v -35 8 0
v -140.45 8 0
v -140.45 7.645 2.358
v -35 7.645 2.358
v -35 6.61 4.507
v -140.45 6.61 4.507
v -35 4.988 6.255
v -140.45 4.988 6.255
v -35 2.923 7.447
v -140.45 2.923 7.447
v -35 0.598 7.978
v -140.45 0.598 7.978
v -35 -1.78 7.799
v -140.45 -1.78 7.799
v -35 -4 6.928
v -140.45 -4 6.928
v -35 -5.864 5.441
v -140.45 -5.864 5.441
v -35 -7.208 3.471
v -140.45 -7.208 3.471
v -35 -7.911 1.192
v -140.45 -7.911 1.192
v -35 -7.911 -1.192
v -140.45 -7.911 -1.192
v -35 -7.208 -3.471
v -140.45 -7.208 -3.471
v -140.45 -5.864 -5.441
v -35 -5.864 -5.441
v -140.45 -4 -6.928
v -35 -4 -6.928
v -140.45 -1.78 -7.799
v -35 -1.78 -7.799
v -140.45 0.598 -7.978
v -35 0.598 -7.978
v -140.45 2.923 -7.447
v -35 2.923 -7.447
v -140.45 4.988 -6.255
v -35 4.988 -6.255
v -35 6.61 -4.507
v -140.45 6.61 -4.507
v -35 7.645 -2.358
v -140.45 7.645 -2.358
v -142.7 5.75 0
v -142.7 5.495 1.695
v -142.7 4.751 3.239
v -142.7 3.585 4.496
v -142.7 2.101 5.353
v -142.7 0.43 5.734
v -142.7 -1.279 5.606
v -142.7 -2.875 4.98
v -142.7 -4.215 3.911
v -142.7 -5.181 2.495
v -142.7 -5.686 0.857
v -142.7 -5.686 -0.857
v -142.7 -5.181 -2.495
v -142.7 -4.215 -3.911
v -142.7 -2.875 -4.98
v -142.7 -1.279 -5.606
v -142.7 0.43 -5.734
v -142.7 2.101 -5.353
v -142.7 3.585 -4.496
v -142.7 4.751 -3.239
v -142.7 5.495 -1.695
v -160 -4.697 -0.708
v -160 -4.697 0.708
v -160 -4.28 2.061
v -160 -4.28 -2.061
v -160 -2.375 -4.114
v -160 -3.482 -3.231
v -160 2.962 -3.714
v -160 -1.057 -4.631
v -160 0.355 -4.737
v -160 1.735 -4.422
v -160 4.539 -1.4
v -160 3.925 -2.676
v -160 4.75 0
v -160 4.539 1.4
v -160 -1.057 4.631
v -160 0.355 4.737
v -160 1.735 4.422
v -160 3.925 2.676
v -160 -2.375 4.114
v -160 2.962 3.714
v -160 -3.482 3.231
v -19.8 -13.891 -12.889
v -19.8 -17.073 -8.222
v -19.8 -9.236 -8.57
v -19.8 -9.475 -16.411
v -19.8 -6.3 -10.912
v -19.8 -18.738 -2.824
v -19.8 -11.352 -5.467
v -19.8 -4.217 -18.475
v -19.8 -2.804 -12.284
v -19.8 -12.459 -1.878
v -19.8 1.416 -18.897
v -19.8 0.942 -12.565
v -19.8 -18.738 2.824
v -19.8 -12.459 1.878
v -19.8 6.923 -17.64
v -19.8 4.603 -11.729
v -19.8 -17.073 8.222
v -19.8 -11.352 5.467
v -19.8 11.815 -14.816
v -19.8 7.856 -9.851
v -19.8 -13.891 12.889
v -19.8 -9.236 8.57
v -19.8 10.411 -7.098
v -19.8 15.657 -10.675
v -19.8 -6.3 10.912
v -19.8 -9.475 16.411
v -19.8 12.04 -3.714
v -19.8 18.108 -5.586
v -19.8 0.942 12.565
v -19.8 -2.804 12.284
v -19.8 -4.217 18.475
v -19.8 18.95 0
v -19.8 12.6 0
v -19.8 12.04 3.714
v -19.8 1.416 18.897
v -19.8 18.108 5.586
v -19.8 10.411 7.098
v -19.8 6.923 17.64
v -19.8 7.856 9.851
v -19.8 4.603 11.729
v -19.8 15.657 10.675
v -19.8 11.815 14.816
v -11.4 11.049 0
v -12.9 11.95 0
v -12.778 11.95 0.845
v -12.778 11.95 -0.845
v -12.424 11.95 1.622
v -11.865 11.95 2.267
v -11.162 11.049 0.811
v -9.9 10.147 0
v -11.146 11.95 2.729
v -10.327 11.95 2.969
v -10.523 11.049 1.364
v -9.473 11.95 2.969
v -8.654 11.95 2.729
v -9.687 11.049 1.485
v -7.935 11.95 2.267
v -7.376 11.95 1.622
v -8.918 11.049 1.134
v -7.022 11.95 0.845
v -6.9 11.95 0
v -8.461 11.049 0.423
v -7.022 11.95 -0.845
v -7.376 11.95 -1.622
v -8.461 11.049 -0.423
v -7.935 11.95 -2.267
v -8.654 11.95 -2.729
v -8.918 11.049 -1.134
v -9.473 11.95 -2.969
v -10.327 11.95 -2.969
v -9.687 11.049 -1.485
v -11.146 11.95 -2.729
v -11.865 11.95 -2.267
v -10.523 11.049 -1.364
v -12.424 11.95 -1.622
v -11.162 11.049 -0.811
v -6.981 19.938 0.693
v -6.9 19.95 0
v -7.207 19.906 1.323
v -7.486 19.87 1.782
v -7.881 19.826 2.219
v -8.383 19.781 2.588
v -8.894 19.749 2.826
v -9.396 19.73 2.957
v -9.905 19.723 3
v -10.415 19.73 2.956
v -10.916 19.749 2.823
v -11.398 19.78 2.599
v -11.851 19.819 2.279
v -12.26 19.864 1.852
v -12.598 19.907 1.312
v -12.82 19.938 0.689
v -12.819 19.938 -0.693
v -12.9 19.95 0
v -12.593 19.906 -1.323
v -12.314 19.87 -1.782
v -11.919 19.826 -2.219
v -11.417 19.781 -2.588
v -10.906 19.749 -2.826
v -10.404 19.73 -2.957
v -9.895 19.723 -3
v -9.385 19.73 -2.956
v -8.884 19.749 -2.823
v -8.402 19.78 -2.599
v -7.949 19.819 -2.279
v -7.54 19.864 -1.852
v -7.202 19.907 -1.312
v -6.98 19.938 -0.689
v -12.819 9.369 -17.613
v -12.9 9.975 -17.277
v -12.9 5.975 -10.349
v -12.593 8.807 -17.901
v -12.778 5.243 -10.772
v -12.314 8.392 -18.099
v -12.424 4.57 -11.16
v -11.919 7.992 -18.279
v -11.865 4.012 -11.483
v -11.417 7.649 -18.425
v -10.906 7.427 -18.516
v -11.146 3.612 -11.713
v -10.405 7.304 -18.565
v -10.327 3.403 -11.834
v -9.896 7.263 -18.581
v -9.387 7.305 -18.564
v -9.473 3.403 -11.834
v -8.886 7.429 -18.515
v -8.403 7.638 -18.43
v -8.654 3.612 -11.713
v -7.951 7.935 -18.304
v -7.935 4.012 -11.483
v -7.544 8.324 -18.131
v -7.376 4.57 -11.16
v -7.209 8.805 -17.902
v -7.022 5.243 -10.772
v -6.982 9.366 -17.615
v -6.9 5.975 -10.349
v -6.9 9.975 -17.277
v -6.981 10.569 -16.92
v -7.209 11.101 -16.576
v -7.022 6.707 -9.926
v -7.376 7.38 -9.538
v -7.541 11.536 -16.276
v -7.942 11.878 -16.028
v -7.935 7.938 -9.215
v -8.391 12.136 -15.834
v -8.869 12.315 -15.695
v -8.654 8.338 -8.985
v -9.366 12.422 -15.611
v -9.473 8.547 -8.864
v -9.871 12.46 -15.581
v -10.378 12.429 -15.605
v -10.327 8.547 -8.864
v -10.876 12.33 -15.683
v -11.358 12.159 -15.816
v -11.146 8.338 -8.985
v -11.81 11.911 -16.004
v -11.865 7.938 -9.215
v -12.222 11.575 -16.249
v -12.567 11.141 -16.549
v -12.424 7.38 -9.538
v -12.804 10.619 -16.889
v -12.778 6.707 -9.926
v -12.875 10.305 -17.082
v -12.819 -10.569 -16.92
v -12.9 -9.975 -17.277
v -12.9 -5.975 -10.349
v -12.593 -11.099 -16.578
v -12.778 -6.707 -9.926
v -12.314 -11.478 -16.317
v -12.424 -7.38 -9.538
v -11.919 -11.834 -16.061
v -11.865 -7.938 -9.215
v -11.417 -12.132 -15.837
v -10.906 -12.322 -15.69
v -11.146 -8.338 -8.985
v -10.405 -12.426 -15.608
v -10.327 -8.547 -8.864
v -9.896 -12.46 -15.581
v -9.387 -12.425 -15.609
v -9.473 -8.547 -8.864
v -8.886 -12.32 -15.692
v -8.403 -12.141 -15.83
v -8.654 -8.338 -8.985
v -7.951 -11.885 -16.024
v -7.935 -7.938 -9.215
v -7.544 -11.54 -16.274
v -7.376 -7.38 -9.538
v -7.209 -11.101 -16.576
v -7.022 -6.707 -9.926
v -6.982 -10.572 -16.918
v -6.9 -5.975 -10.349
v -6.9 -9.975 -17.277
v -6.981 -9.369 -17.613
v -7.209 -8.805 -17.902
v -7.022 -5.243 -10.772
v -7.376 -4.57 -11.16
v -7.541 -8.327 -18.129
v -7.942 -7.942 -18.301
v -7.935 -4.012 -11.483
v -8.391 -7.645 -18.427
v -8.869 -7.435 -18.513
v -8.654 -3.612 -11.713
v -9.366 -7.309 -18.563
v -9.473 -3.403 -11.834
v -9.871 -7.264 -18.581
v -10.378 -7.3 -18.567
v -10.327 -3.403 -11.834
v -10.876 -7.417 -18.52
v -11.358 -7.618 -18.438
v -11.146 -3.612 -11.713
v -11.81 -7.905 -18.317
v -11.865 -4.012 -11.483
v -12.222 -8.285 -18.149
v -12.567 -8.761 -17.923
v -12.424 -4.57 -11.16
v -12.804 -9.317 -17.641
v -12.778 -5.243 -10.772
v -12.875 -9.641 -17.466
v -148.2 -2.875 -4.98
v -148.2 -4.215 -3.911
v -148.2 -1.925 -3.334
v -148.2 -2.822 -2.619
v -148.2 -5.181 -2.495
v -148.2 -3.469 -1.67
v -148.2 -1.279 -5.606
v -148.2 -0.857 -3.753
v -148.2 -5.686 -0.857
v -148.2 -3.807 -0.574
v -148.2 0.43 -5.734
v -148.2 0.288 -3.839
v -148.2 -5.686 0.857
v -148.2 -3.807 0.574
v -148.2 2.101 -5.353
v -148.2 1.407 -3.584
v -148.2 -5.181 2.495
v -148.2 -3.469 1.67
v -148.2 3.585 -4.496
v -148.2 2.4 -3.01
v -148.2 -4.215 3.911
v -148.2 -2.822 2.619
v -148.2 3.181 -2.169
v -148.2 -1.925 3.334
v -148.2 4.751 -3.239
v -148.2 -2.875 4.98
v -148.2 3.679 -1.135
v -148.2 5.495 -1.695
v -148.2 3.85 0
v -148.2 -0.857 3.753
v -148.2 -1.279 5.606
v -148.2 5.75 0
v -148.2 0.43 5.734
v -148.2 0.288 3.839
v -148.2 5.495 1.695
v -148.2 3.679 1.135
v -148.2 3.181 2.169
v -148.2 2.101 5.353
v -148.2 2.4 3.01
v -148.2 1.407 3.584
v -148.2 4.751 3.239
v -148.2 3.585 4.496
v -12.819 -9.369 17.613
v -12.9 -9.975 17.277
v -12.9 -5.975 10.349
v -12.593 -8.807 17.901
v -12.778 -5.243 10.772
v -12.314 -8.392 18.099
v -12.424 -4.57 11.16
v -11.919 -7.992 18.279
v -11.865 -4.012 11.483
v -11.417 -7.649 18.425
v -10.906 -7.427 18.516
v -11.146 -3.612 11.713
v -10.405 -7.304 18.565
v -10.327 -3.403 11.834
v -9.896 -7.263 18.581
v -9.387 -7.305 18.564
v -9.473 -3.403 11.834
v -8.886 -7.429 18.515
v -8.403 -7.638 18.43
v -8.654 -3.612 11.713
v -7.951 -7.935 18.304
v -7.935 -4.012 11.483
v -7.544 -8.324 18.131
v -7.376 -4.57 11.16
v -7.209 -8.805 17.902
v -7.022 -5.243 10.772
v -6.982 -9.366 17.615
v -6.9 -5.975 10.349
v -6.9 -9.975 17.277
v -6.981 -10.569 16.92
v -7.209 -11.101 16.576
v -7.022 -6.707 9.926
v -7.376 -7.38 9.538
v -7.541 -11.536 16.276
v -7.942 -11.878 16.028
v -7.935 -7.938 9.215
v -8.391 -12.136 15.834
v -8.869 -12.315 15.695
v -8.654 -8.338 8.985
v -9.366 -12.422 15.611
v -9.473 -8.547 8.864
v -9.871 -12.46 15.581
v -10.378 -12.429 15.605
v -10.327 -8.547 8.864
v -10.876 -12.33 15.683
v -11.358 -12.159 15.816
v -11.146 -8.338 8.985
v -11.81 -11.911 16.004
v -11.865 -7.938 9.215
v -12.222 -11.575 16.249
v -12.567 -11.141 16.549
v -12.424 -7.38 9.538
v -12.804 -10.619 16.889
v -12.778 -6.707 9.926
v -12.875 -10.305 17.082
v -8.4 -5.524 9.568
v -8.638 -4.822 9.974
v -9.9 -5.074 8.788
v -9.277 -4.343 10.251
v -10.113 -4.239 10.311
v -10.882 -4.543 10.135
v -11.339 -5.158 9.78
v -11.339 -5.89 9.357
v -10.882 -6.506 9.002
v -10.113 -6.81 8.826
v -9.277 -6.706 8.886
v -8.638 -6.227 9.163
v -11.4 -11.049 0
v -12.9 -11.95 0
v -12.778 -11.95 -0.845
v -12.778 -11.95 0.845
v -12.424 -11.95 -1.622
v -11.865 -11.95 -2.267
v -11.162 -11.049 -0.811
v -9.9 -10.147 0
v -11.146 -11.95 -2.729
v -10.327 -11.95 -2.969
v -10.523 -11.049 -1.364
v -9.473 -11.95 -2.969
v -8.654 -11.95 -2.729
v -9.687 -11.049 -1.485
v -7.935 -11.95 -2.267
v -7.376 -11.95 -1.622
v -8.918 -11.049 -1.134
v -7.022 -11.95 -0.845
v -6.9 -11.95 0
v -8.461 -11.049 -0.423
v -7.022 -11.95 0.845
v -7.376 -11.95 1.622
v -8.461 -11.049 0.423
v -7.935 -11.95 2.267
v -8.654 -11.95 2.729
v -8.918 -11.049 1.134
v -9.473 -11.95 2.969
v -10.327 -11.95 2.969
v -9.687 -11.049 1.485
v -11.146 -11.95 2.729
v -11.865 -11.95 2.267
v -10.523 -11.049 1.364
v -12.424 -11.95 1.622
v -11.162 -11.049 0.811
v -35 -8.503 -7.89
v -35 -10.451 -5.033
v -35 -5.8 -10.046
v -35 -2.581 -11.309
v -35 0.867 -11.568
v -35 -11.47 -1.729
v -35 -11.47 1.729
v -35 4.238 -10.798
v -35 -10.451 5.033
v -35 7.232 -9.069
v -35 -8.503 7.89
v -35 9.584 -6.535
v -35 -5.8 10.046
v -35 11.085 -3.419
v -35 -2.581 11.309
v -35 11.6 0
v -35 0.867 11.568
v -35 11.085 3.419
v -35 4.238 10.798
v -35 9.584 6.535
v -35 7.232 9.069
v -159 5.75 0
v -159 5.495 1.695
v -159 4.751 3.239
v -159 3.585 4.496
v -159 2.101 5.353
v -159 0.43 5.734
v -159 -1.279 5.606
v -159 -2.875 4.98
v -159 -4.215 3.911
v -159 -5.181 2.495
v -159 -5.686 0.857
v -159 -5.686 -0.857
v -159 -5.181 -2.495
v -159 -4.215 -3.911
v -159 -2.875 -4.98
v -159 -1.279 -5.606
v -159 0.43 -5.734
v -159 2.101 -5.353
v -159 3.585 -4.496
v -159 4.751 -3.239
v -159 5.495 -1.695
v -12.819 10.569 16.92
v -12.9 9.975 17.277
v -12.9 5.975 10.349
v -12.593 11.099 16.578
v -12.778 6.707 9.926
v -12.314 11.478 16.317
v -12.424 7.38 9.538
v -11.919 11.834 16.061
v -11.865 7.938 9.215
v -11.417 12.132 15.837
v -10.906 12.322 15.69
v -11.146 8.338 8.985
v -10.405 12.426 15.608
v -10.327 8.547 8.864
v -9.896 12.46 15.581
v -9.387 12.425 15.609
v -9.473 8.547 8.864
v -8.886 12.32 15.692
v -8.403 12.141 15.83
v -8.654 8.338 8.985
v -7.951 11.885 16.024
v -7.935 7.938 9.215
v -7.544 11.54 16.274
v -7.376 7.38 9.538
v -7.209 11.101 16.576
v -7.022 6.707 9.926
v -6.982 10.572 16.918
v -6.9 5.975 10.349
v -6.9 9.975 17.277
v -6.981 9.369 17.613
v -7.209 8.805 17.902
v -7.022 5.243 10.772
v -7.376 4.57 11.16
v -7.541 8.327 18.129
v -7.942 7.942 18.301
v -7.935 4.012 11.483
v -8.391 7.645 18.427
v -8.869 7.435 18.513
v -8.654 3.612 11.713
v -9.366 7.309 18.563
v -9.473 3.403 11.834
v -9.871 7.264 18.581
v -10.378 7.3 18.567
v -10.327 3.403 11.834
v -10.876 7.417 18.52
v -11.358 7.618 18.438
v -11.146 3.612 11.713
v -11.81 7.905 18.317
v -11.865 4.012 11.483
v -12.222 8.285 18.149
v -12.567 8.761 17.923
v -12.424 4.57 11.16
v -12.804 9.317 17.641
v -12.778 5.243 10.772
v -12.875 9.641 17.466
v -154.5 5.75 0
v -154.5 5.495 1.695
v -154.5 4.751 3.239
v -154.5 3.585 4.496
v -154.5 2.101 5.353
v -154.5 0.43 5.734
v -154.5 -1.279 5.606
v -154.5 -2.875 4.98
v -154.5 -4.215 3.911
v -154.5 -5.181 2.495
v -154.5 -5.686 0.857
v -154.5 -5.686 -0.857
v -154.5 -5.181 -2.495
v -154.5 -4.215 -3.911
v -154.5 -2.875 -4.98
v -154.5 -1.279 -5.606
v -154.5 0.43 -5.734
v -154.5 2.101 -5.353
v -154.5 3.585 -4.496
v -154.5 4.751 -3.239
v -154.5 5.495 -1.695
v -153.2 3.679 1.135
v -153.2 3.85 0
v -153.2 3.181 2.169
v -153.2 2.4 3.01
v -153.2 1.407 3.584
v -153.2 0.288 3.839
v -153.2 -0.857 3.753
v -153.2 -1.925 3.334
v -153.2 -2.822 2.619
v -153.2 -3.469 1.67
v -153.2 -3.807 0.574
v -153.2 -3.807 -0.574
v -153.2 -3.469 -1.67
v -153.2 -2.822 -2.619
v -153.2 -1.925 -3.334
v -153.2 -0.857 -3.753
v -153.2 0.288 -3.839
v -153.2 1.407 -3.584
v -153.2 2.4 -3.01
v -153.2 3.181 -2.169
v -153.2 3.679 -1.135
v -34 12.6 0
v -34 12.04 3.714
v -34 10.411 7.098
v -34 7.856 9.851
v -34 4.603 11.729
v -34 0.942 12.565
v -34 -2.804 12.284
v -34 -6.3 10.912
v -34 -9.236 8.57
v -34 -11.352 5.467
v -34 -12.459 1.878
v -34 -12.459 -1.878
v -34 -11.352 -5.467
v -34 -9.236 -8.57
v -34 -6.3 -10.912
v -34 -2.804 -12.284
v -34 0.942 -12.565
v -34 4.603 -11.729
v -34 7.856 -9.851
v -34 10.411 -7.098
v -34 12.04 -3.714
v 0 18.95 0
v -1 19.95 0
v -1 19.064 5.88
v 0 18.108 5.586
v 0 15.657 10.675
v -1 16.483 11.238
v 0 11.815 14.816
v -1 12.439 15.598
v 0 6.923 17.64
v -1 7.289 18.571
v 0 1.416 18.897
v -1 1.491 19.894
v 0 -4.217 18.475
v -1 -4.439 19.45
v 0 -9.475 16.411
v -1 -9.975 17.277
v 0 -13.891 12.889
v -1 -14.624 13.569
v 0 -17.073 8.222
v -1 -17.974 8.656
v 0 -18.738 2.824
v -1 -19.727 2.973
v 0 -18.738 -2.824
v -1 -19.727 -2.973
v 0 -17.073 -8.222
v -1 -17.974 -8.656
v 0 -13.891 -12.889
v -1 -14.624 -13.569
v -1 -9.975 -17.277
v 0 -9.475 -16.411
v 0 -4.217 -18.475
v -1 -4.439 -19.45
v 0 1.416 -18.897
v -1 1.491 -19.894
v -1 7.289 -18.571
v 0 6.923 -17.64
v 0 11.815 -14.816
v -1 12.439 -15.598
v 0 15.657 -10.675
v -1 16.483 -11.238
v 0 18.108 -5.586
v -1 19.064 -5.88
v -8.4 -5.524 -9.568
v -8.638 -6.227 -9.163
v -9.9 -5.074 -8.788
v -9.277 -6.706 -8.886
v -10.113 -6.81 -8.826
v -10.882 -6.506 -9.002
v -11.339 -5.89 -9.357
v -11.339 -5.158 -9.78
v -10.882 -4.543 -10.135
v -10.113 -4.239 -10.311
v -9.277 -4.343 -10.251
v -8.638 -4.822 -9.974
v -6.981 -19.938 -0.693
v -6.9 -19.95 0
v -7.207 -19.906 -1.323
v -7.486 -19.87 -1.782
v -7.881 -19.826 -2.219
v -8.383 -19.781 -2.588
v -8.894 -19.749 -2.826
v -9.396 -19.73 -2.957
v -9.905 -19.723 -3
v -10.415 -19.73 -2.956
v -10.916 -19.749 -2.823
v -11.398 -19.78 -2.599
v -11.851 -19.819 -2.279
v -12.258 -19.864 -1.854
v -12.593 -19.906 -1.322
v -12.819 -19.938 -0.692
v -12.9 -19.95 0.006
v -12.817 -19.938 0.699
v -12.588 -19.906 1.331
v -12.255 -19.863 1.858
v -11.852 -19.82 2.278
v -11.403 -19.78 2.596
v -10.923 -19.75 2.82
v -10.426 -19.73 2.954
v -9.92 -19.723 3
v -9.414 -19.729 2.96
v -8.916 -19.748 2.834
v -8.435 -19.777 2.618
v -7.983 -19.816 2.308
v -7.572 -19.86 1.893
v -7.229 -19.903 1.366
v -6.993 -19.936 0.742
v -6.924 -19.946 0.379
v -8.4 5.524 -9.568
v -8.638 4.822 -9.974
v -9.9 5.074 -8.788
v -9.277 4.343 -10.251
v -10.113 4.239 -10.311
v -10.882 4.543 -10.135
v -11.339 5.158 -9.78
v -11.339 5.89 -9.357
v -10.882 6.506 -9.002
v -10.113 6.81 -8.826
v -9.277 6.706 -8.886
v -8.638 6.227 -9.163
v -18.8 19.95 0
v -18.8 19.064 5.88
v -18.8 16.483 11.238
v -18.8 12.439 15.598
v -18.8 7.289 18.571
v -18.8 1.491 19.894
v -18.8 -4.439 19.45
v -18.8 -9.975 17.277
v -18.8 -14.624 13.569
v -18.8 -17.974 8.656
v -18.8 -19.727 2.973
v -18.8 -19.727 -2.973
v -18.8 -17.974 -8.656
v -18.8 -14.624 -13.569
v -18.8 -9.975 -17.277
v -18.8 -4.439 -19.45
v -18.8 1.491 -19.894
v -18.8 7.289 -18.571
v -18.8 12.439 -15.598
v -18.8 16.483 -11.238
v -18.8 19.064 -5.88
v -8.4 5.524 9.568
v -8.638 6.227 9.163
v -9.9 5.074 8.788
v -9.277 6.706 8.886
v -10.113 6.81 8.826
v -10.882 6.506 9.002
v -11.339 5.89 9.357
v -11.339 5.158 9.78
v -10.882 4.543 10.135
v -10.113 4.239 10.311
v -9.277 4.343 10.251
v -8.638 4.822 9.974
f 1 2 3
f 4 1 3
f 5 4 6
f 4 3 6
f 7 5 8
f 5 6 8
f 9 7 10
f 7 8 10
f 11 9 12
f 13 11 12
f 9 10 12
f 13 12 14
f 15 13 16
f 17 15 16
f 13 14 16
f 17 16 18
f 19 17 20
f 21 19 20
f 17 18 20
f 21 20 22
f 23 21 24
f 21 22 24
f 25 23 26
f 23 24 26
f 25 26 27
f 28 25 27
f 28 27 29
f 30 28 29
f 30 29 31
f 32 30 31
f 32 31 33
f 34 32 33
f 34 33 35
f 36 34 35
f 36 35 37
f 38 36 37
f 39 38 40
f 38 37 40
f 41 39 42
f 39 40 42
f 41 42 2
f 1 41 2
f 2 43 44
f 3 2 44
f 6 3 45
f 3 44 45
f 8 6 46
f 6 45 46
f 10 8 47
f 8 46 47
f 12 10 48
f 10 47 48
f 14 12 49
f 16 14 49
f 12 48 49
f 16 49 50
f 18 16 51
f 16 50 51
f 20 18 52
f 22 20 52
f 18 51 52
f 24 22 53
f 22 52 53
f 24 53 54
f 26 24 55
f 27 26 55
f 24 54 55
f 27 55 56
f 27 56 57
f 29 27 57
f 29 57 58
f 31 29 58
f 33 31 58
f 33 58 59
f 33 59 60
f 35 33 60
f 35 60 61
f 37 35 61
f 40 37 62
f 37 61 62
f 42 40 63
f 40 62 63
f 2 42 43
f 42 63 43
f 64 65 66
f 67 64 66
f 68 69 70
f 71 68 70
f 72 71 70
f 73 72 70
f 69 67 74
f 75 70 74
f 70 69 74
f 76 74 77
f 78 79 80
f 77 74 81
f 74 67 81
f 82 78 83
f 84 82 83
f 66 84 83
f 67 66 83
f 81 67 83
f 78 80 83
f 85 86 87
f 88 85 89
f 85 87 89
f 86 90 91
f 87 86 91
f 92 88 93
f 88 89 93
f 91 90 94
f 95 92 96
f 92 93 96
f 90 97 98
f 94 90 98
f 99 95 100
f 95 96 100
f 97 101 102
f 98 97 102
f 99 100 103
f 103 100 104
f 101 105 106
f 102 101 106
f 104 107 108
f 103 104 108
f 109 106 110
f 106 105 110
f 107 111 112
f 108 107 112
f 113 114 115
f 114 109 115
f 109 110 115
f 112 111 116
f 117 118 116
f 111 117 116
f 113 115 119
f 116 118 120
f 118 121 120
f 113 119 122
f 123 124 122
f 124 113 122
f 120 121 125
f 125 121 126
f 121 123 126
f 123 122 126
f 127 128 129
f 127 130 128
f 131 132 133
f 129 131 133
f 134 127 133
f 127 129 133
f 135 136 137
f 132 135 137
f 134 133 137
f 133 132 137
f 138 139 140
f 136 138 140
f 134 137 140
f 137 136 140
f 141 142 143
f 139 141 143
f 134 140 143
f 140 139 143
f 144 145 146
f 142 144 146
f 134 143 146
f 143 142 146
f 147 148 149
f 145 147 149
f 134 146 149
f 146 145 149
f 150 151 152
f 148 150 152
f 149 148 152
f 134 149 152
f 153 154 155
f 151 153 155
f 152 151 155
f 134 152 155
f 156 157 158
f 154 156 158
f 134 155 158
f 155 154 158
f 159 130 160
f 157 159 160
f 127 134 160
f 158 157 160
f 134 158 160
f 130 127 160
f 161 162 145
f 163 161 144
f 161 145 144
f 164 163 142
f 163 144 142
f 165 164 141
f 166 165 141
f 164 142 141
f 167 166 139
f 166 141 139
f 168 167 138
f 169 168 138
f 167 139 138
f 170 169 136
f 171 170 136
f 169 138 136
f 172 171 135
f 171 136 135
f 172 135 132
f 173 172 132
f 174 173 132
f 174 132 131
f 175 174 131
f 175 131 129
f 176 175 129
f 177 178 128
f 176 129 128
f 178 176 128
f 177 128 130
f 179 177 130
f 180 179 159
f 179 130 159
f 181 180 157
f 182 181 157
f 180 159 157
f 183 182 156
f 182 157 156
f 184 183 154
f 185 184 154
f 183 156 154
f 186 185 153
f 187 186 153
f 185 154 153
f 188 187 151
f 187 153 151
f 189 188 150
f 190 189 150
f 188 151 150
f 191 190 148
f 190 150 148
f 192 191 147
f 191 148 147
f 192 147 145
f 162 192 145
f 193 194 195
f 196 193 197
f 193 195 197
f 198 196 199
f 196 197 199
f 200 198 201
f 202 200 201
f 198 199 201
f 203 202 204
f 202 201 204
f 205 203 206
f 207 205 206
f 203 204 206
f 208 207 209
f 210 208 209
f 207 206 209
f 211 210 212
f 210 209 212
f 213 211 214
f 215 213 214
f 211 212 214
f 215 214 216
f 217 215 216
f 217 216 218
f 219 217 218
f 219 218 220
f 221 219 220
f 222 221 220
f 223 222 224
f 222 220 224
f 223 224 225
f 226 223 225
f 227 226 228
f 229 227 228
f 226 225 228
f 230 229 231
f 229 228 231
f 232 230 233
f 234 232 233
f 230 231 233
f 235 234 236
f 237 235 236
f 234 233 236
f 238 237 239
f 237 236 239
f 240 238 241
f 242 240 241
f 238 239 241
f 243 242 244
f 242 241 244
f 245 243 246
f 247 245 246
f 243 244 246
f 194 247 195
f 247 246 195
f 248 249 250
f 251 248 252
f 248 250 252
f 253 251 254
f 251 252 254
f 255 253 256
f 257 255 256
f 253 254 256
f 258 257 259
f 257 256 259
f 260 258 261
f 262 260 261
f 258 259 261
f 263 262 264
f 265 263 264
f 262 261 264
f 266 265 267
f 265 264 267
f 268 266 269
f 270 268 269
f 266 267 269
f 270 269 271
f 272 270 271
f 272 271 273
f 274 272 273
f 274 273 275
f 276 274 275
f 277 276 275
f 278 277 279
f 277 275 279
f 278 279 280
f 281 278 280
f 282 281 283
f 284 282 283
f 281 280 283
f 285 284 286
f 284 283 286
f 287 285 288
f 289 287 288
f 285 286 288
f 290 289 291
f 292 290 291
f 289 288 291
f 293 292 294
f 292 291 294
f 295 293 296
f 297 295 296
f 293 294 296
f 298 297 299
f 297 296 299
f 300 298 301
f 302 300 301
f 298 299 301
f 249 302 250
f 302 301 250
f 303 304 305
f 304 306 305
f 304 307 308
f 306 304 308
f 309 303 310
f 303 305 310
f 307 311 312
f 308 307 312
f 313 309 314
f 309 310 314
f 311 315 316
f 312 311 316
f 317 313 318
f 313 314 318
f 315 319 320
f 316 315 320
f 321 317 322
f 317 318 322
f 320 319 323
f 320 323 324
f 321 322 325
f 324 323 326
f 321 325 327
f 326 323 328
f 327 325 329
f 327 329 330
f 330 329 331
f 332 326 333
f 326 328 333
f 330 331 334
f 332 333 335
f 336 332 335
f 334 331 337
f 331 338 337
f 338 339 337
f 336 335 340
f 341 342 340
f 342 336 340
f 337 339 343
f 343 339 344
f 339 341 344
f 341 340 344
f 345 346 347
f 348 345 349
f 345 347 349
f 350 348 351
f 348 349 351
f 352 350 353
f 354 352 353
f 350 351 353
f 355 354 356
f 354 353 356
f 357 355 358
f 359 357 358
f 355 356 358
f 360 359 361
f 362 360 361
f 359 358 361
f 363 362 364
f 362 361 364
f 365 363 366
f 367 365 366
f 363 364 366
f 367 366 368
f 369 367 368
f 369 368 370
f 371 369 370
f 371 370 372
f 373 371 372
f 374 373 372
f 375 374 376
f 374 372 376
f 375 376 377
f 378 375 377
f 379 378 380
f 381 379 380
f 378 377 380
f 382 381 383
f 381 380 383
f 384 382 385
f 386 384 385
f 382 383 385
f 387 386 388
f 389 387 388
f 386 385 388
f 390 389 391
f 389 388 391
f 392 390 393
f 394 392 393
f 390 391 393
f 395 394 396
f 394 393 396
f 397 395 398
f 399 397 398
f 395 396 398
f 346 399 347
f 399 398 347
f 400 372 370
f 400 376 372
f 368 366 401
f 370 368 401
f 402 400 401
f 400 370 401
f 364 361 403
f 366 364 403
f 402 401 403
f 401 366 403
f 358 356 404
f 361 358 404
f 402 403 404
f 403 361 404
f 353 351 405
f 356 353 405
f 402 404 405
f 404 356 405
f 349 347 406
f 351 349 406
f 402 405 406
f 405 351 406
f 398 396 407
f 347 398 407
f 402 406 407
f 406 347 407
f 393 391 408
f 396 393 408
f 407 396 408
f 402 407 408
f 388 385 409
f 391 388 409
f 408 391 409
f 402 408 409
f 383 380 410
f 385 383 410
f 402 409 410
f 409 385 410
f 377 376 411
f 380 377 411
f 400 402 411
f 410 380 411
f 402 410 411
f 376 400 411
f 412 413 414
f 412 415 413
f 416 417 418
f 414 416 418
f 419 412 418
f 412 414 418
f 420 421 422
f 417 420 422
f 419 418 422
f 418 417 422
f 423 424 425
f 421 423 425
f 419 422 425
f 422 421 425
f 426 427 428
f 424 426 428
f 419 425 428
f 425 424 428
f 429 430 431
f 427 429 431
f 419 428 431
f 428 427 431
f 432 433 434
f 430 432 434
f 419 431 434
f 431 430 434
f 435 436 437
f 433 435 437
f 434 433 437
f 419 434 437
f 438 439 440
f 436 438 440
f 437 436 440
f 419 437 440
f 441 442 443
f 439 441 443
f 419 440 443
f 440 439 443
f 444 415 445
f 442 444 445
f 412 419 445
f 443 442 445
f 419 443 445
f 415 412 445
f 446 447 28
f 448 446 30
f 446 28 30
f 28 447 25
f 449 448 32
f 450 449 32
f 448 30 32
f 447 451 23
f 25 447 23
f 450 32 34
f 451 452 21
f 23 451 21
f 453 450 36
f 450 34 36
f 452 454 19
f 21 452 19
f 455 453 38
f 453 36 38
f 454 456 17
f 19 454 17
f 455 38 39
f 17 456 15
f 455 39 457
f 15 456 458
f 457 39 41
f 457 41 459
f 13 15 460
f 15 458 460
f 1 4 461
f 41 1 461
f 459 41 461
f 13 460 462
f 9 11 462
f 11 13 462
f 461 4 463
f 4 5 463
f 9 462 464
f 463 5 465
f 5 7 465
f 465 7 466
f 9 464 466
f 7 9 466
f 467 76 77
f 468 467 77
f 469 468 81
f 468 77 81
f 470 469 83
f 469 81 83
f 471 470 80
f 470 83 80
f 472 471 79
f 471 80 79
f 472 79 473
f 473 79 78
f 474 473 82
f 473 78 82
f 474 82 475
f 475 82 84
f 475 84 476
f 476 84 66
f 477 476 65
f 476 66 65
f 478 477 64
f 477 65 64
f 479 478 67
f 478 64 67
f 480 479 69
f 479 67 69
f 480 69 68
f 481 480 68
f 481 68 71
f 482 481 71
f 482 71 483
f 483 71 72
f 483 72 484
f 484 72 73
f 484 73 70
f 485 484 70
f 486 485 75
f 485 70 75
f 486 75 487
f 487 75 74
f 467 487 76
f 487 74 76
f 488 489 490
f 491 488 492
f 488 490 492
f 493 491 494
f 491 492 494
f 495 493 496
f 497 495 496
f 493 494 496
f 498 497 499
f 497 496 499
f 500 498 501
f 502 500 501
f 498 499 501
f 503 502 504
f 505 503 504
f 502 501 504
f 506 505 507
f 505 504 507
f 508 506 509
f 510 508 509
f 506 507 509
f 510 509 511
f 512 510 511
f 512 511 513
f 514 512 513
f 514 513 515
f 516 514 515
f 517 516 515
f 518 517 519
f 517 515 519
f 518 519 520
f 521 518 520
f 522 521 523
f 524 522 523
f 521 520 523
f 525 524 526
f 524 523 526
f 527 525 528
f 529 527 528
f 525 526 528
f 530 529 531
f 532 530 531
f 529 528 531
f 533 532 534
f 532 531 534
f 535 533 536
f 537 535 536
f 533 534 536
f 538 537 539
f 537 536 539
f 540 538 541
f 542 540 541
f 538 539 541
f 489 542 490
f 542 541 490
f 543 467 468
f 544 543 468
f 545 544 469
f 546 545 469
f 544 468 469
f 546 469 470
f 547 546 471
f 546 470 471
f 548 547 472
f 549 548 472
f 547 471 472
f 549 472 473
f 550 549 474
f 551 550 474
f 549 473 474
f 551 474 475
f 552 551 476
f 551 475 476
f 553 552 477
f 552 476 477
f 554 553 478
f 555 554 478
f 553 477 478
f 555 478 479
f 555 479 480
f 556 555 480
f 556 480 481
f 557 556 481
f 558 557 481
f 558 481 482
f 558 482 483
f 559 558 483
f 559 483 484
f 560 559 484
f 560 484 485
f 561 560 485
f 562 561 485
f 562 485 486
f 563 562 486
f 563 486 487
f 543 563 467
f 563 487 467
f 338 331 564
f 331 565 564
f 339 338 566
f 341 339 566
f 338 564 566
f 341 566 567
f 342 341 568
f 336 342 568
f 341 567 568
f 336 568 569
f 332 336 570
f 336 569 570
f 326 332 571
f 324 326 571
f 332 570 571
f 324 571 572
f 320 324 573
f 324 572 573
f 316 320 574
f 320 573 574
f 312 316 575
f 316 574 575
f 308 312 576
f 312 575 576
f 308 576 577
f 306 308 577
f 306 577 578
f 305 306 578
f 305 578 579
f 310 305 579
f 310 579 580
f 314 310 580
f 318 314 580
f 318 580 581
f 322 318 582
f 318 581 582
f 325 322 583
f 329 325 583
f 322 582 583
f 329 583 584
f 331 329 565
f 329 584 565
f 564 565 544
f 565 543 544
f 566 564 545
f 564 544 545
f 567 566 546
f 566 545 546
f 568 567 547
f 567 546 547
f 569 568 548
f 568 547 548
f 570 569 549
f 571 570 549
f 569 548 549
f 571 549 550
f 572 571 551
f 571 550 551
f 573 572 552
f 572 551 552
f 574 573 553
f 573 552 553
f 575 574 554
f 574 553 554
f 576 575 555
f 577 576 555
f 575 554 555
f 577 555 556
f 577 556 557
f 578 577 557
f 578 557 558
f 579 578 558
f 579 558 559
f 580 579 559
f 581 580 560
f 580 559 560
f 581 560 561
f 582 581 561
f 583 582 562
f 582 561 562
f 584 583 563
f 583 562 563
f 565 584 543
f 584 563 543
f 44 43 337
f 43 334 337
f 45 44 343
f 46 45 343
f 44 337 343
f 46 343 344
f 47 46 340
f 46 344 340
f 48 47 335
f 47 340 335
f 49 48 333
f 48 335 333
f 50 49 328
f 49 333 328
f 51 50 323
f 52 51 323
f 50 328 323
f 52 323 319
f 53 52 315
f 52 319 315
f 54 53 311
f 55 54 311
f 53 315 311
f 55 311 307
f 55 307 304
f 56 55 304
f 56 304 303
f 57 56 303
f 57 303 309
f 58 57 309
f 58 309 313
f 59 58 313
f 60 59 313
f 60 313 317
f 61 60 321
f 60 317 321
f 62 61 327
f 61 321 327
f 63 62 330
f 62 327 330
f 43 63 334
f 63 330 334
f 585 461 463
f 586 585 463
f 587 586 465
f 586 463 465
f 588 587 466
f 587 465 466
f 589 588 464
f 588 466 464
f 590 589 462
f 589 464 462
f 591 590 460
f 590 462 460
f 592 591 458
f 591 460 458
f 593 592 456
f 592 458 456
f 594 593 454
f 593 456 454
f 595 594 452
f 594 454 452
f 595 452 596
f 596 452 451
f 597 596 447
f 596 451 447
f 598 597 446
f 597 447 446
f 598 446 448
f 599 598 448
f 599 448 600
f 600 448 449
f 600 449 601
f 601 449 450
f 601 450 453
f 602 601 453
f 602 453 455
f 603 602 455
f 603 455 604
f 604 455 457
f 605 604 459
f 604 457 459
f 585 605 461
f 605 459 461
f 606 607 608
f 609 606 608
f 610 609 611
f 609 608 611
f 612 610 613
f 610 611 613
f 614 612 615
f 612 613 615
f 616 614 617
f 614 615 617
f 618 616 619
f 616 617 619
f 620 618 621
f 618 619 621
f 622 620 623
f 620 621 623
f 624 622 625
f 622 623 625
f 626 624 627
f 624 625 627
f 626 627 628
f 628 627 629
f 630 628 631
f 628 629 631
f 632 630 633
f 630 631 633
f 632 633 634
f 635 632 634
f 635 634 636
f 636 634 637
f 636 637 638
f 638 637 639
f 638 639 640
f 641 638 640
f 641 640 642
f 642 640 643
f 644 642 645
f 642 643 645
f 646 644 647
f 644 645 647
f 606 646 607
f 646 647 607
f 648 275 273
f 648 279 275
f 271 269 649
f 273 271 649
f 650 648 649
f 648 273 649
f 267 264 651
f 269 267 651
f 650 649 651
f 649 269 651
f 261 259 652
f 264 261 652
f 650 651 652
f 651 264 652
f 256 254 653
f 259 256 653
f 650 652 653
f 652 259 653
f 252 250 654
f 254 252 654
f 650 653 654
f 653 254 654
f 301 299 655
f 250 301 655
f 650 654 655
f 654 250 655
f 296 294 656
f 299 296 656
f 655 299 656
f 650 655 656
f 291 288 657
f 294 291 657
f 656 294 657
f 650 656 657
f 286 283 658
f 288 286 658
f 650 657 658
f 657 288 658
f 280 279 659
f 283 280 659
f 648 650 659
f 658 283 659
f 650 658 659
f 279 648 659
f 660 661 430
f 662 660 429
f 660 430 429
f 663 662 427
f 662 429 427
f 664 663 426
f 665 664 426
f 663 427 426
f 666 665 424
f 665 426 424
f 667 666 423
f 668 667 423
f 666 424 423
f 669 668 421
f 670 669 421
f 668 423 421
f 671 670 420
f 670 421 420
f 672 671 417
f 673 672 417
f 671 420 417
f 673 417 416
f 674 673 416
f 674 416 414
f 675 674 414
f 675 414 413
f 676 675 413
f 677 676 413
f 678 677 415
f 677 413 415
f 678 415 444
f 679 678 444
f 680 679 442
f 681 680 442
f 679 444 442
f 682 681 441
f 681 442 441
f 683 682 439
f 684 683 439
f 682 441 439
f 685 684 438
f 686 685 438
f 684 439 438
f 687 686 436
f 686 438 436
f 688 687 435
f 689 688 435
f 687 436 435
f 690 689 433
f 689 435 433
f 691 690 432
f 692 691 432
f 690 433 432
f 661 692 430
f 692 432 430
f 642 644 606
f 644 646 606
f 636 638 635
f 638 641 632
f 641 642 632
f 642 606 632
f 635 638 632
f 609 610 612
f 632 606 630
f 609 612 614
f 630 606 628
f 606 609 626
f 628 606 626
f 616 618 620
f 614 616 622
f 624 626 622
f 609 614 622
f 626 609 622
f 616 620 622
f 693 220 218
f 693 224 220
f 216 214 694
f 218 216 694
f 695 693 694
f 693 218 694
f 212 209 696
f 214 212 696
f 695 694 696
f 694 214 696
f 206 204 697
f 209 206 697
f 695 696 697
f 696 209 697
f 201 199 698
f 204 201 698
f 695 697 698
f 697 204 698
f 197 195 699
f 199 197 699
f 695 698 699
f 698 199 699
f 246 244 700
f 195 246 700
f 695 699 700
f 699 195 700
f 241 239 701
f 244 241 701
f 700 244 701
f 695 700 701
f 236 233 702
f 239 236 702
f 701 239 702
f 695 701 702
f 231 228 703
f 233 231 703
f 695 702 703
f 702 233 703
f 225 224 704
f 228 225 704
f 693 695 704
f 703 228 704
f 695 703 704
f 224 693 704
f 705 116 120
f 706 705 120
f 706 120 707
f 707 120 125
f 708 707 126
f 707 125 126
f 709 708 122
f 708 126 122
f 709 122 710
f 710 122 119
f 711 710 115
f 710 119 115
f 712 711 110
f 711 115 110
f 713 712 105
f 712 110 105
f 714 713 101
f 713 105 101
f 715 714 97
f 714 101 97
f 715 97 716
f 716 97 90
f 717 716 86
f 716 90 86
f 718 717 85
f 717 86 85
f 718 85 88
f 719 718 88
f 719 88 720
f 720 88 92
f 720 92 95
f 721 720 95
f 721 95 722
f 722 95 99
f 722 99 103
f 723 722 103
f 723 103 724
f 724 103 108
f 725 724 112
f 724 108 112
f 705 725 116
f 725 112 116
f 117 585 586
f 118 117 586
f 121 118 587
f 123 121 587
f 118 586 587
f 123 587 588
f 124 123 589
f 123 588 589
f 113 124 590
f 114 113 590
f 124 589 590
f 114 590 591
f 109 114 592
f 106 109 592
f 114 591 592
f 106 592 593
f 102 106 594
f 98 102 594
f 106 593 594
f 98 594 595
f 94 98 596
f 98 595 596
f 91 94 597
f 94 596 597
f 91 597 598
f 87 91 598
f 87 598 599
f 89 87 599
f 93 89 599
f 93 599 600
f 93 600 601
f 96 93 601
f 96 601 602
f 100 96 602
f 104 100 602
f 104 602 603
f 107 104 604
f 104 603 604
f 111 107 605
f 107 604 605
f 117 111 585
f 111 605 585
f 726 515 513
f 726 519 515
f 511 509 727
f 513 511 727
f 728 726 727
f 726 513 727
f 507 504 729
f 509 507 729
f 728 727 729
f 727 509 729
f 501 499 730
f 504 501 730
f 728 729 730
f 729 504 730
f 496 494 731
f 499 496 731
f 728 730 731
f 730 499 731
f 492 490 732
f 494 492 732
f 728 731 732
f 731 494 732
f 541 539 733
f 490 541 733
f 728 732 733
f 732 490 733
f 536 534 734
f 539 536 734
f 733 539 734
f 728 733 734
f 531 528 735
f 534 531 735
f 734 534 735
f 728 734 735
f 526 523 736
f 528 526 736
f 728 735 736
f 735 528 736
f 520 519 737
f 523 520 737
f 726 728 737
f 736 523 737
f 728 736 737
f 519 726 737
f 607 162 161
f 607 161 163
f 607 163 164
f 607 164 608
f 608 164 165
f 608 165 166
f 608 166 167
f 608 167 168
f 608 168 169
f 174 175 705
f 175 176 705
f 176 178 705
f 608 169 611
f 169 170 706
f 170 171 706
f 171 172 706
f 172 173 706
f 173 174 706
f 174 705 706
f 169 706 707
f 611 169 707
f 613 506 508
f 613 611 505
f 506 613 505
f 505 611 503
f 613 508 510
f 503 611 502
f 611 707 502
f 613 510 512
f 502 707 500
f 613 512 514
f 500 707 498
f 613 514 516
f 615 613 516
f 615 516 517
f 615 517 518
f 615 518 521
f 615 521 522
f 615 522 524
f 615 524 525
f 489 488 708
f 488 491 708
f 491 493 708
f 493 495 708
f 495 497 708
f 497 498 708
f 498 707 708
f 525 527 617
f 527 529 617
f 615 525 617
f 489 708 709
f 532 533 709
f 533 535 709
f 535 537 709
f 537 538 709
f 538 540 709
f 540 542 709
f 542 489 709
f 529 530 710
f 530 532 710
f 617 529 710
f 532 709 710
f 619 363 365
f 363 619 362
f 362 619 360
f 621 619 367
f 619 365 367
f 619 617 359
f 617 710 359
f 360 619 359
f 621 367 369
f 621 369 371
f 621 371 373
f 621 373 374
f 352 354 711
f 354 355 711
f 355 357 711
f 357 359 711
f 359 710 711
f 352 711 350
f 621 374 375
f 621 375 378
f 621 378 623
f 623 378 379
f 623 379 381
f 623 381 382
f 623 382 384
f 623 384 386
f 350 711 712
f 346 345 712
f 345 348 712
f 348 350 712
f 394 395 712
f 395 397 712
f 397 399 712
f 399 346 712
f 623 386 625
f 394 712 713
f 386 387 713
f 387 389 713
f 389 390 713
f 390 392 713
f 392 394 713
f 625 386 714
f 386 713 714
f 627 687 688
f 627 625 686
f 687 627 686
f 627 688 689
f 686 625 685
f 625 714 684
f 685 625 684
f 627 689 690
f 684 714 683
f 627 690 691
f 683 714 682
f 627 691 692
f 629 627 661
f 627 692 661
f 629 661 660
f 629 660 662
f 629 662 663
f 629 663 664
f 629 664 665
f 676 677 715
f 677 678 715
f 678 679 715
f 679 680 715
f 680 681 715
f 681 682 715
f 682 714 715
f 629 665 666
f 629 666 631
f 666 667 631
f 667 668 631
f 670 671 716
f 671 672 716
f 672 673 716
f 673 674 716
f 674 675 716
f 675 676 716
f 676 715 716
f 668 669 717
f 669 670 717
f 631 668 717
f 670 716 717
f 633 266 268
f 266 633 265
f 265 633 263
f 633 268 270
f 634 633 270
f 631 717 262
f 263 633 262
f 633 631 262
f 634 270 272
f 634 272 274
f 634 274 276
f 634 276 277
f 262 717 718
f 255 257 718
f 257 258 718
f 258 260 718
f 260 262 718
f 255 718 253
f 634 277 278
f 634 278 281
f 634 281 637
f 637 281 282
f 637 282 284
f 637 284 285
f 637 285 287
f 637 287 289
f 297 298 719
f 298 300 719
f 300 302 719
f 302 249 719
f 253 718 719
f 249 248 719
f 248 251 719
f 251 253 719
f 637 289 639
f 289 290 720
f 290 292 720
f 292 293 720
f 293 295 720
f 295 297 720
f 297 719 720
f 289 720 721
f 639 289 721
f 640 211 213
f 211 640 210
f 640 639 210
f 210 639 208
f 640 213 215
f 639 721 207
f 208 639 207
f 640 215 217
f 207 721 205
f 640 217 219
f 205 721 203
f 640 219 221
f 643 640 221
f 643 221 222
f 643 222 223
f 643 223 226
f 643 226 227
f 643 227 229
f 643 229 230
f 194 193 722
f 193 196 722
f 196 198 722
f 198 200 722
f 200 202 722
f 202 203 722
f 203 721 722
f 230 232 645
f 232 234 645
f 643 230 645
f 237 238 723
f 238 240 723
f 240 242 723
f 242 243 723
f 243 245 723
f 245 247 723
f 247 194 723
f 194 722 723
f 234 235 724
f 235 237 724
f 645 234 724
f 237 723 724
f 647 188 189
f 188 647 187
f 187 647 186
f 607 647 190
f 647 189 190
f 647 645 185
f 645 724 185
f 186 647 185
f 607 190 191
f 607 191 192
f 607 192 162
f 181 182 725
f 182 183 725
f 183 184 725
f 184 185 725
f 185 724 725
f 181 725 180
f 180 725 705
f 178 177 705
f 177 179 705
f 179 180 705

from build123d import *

# Parameters (mm, degrees)
F2_SIZE   = 1
F3_SIZE   = 2.24999
F17_D     = 6
F17_DEPTH = 8
F17_TIP   = 1.8025818571
F18_D     = 6
F18_DEPTH = 8
F18_TIP   = 1.8025818571
F19_D     = 6
F19_DEPTH = 8
F19_TIP   = 1.8025818571
F20_D     = 6
F20_DEPTH = 8
F20_TIP   = 1.8025818571
F21_D     = 6
F21_DEPTH = 8
F21_TIP   = 1.8025818571
F22_D     = 6
F22_DEPTH = 8
F22_TIP   = 1.8025818571


# Not quite as in the source:
# - a fillet or chamfer is up to 0.001 mm smaller than in the source, because OpenCascade refuses the exact size


with BuildPart() as f1:
    # F0 (on Top) → F1 (revolve)
    with BuildSketch(Plane.XY):
        Polygon((-160, 0), (0, 0), (0, 19.95), (-19.8, 19.95), (-19.8, 12.6), (-35, 12.6), (-35, 8), (-142.7, 8), (-142.7, 5.75), (-148.2, 5.75), (-148.2, 3.85), (-153.2, 3.85), (-154.5, 5.75), (-160, 5.75), align=None)
    revolve(axis=Axis((-80, 0, 0), (1, 0, 0)))

    # F2
    f2_edges = [f1.edges().sort_by_distance(p)[0] for p in [
        (-160, -5.75, 0),
        (0, -19.95, 0),
        (-35, -12.6, 0),
        (-19.8, -19.95, 0),
    ]]
    chamfer(f2_edges, length=F2_SIZE)

    # F3 (size 2.25 in the source; OpenCascade refuses exactly that, so slightly less here)
    f3_edges = [f1.edges().sort_by_distance(p)[0] for p in [
        (-142.7, -8, 0),
    ]]
    chamfer(f3_edges, length=F3_SIZE)

    # F17
    with Locations(Plane(origin=(0, -19.95, 0), x_dir=(-1, 0, 0), z_dir=(0, -1, 0))):
        with Locations((9.9, 0)):
            Hole(F17_D / 2, depth=F17_DEPTH)
            with Locations((0, 0, -(F17_DEPTH + F17_TIP / 2))):  # 118° drill point
                Cone(0, F17_D / 2, F17_TIP, mode=Mode.SUBTRACT)

    # F18
    with Locations(Plane(origin=(0, -9.975, 17.2772068055), x_dir=(1, 0, 0), z_dir=(0, -0.5, 0.8660254038))):
        with Locations((-9.9, 0)):
            Hole(F18_D / 2, depth=F18_DEPTH)
            with Locations((0, 0, -(F18_DEPTH + F18_TIP / 2))):  # 118° drill point
                Cone(0, F18_D / 2, F18_TIP, mode=Mode.SUBTRACT)

    # F19
    with Locations(Plane(origin=(0, 9.975, 17.2772068055), x_dir=(1, 0, 0), z_dir=(0, 0.5, 0.8660254038))):
        with Locations((-9.9, 0)):
            Hole(F19_D / 2, depth=F19_DEPTH)
            with Locations((0, 0, -(F19_DEPTH + F19_TIP / 2))):  # 118° drill point
                Cone(0, F19_D / 2, F19_TIP, mode=Mode.SUBTRACT)

    # F20
    with Locations(Plane(origin=(0, 19.95, 0), x_dir=(-1, 0, 0), z_dir=(0, 1, 0))):
        with Locations((9.9, 0)):
            Hole(F20_D / 2, depth=F20_DEPTH)
            with Locations((0, 0, -(F20_DEPTH + F20_TIP / 2))):  # 118° drill point
                Cone(0, F20_D / 2, F20_TIP, mode=Mode.SUBTRACT)

    # F21
    with Locations(Plane(origin=(0, 9.975, -17.2772068055), x_dir=(1, 0, 0), z_dir=(0, 0.5, -0.8660254038))):
        with Locations((-9.9, 0)):
            Hole(F21_D / 2, depth=F21_DEPTH)
            with Locations((0, 0, -(F21_DEPTH + F21_TIP / 2))):  # 118° drill point
                Cone(0, F21_D / 2, F21_TIP, mode=Mode.SUBTRACT)

    # F22
    with Locations(Plane(origin=(0, -9.975, -17.2772068055), x_dir=(1, 0, 0), z_dir=(0, -0.5, -0.8660254038))):
        with Locations((-9.9, 0)):
            Hole(F22_D / 2, depth=F22_DEPTH)
            with Locations((0, 0, -(F22_DEPTH + F22_TIP / 2))):  # 118° drill point
                Cone(0, F22_D / 2, F22_TIP, mode=Mode.SUBTRACT)


solid = f1.part
